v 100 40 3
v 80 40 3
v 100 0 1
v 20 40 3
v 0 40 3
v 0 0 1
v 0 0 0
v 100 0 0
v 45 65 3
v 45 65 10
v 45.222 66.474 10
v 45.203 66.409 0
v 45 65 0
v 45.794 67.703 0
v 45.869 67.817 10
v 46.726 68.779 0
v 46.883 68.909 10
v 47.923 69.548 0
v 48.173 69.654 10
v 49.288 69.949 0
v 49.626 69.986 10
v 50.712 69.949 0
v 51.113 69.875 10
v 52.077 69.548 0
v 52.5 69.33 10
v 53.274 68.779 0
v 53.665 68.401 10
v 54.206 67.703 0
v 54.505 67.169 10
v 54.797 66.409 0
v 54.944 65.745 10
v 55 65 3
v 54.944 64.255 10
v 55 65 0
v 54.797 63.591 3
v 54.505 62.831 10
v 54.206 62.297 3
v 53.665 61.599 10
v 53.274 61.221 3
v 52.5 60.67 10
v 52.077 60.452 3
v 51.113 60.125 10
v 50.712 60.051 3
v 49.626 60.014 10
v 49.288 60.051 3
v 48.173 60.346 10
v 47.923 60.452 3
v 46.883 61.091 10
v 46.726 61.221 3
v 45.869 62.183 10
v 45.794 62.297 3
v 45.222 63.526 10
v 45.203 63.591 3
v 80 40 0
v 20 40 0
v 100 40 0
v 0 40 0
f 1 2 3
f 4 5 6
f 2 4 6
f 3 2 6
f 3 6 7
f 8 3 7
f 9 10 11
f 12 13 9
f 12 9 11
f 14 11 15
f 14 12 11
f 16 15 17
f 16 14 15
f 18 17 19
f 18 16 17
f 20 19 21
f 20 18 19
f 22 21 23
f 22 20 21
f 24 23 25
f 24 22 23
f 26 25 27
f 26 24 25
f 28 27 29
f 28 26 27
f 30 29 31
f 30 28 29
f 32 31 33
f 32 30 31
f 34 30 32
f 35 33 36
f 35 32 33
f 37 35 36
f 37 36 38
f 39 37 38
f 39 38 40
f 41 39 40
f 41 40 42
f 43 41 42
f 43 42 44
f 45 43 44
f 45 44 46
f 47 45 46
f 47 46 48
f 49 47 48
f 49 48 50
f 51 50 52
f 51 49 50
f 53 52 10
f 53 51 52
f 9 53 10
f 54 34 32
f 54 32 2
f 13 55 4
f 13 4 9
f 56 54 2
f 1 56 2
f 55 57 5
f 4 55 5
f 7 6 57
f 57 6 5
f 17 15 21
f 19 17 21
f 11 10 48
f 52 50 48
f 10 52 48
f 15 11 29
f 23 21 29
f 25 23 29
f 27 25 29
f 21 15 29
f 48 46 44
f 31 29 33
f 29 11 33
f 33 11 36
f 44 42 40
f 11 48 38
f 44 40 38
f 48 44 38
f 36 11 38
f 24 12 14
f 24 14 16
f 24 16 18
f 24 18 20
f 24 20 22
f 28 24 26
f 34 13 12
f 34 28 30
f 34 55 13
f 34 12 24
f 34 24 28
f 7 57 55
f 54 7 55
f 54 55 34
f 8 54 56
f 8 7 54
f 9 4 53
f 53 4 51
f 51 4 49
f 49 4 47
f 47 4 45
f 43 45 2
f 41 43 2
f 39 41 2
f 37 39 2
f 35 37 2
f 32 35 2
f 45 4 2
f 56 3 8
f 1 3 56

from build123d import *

# Parameters (mm, degrees)
F1_DEPTH = 100
F3_DEPTH = 3
F4_DEPTH = 10


with BuildPart() as f1:
    # F0 (on Right) → F1 (new body)
    with BuildSketch(Plane.YZ):
        Polygon((0, 1), (0, 0), (40, 0), (40, 3), align=None)
    extrude(amount=F1_DEPTH)

    # F2 (on face) → F3 (join)
    with BuildSketch(Plane(origin=(0, 0, 0), x_dir=(1, 0, 0), z_dir=(0, 0, -1))):
        with BuildLine():
            ThreePointArc((45, -65), (50, -60), (55, -65))
            Line((55, -65), (55, -40))
            Line((55, -40), (45, -40))
            Line((45, -40), (45, -65))
        make_face()
        Polygon((20, -40), (45, -65), (45, -40), align=None)
        Polygon((55, -40), (55, -65), (80, -40), align=None)
    extrude(amount=-F3_DEPTH)

    # F2 (on face) → F4 (join)
    with BuildSketch(Plane(origin=(0, 0, 0), x_dir=(1, 0, 0), z_dir=(0, 0, -1))):
        with BuildLine():
            Line((45, -65), (55, -65))
            ThreePointArc((55, -65), (50, -60), (45, -65))
        make_face()
        with BuildLine():
            ThreePointArc((45, -65), (50, -70), (55, -65))
            Line((55, -65), (45, -65))
        make_face()
    extrude(amount=-F4_DEPTH)


solid = f1.part
